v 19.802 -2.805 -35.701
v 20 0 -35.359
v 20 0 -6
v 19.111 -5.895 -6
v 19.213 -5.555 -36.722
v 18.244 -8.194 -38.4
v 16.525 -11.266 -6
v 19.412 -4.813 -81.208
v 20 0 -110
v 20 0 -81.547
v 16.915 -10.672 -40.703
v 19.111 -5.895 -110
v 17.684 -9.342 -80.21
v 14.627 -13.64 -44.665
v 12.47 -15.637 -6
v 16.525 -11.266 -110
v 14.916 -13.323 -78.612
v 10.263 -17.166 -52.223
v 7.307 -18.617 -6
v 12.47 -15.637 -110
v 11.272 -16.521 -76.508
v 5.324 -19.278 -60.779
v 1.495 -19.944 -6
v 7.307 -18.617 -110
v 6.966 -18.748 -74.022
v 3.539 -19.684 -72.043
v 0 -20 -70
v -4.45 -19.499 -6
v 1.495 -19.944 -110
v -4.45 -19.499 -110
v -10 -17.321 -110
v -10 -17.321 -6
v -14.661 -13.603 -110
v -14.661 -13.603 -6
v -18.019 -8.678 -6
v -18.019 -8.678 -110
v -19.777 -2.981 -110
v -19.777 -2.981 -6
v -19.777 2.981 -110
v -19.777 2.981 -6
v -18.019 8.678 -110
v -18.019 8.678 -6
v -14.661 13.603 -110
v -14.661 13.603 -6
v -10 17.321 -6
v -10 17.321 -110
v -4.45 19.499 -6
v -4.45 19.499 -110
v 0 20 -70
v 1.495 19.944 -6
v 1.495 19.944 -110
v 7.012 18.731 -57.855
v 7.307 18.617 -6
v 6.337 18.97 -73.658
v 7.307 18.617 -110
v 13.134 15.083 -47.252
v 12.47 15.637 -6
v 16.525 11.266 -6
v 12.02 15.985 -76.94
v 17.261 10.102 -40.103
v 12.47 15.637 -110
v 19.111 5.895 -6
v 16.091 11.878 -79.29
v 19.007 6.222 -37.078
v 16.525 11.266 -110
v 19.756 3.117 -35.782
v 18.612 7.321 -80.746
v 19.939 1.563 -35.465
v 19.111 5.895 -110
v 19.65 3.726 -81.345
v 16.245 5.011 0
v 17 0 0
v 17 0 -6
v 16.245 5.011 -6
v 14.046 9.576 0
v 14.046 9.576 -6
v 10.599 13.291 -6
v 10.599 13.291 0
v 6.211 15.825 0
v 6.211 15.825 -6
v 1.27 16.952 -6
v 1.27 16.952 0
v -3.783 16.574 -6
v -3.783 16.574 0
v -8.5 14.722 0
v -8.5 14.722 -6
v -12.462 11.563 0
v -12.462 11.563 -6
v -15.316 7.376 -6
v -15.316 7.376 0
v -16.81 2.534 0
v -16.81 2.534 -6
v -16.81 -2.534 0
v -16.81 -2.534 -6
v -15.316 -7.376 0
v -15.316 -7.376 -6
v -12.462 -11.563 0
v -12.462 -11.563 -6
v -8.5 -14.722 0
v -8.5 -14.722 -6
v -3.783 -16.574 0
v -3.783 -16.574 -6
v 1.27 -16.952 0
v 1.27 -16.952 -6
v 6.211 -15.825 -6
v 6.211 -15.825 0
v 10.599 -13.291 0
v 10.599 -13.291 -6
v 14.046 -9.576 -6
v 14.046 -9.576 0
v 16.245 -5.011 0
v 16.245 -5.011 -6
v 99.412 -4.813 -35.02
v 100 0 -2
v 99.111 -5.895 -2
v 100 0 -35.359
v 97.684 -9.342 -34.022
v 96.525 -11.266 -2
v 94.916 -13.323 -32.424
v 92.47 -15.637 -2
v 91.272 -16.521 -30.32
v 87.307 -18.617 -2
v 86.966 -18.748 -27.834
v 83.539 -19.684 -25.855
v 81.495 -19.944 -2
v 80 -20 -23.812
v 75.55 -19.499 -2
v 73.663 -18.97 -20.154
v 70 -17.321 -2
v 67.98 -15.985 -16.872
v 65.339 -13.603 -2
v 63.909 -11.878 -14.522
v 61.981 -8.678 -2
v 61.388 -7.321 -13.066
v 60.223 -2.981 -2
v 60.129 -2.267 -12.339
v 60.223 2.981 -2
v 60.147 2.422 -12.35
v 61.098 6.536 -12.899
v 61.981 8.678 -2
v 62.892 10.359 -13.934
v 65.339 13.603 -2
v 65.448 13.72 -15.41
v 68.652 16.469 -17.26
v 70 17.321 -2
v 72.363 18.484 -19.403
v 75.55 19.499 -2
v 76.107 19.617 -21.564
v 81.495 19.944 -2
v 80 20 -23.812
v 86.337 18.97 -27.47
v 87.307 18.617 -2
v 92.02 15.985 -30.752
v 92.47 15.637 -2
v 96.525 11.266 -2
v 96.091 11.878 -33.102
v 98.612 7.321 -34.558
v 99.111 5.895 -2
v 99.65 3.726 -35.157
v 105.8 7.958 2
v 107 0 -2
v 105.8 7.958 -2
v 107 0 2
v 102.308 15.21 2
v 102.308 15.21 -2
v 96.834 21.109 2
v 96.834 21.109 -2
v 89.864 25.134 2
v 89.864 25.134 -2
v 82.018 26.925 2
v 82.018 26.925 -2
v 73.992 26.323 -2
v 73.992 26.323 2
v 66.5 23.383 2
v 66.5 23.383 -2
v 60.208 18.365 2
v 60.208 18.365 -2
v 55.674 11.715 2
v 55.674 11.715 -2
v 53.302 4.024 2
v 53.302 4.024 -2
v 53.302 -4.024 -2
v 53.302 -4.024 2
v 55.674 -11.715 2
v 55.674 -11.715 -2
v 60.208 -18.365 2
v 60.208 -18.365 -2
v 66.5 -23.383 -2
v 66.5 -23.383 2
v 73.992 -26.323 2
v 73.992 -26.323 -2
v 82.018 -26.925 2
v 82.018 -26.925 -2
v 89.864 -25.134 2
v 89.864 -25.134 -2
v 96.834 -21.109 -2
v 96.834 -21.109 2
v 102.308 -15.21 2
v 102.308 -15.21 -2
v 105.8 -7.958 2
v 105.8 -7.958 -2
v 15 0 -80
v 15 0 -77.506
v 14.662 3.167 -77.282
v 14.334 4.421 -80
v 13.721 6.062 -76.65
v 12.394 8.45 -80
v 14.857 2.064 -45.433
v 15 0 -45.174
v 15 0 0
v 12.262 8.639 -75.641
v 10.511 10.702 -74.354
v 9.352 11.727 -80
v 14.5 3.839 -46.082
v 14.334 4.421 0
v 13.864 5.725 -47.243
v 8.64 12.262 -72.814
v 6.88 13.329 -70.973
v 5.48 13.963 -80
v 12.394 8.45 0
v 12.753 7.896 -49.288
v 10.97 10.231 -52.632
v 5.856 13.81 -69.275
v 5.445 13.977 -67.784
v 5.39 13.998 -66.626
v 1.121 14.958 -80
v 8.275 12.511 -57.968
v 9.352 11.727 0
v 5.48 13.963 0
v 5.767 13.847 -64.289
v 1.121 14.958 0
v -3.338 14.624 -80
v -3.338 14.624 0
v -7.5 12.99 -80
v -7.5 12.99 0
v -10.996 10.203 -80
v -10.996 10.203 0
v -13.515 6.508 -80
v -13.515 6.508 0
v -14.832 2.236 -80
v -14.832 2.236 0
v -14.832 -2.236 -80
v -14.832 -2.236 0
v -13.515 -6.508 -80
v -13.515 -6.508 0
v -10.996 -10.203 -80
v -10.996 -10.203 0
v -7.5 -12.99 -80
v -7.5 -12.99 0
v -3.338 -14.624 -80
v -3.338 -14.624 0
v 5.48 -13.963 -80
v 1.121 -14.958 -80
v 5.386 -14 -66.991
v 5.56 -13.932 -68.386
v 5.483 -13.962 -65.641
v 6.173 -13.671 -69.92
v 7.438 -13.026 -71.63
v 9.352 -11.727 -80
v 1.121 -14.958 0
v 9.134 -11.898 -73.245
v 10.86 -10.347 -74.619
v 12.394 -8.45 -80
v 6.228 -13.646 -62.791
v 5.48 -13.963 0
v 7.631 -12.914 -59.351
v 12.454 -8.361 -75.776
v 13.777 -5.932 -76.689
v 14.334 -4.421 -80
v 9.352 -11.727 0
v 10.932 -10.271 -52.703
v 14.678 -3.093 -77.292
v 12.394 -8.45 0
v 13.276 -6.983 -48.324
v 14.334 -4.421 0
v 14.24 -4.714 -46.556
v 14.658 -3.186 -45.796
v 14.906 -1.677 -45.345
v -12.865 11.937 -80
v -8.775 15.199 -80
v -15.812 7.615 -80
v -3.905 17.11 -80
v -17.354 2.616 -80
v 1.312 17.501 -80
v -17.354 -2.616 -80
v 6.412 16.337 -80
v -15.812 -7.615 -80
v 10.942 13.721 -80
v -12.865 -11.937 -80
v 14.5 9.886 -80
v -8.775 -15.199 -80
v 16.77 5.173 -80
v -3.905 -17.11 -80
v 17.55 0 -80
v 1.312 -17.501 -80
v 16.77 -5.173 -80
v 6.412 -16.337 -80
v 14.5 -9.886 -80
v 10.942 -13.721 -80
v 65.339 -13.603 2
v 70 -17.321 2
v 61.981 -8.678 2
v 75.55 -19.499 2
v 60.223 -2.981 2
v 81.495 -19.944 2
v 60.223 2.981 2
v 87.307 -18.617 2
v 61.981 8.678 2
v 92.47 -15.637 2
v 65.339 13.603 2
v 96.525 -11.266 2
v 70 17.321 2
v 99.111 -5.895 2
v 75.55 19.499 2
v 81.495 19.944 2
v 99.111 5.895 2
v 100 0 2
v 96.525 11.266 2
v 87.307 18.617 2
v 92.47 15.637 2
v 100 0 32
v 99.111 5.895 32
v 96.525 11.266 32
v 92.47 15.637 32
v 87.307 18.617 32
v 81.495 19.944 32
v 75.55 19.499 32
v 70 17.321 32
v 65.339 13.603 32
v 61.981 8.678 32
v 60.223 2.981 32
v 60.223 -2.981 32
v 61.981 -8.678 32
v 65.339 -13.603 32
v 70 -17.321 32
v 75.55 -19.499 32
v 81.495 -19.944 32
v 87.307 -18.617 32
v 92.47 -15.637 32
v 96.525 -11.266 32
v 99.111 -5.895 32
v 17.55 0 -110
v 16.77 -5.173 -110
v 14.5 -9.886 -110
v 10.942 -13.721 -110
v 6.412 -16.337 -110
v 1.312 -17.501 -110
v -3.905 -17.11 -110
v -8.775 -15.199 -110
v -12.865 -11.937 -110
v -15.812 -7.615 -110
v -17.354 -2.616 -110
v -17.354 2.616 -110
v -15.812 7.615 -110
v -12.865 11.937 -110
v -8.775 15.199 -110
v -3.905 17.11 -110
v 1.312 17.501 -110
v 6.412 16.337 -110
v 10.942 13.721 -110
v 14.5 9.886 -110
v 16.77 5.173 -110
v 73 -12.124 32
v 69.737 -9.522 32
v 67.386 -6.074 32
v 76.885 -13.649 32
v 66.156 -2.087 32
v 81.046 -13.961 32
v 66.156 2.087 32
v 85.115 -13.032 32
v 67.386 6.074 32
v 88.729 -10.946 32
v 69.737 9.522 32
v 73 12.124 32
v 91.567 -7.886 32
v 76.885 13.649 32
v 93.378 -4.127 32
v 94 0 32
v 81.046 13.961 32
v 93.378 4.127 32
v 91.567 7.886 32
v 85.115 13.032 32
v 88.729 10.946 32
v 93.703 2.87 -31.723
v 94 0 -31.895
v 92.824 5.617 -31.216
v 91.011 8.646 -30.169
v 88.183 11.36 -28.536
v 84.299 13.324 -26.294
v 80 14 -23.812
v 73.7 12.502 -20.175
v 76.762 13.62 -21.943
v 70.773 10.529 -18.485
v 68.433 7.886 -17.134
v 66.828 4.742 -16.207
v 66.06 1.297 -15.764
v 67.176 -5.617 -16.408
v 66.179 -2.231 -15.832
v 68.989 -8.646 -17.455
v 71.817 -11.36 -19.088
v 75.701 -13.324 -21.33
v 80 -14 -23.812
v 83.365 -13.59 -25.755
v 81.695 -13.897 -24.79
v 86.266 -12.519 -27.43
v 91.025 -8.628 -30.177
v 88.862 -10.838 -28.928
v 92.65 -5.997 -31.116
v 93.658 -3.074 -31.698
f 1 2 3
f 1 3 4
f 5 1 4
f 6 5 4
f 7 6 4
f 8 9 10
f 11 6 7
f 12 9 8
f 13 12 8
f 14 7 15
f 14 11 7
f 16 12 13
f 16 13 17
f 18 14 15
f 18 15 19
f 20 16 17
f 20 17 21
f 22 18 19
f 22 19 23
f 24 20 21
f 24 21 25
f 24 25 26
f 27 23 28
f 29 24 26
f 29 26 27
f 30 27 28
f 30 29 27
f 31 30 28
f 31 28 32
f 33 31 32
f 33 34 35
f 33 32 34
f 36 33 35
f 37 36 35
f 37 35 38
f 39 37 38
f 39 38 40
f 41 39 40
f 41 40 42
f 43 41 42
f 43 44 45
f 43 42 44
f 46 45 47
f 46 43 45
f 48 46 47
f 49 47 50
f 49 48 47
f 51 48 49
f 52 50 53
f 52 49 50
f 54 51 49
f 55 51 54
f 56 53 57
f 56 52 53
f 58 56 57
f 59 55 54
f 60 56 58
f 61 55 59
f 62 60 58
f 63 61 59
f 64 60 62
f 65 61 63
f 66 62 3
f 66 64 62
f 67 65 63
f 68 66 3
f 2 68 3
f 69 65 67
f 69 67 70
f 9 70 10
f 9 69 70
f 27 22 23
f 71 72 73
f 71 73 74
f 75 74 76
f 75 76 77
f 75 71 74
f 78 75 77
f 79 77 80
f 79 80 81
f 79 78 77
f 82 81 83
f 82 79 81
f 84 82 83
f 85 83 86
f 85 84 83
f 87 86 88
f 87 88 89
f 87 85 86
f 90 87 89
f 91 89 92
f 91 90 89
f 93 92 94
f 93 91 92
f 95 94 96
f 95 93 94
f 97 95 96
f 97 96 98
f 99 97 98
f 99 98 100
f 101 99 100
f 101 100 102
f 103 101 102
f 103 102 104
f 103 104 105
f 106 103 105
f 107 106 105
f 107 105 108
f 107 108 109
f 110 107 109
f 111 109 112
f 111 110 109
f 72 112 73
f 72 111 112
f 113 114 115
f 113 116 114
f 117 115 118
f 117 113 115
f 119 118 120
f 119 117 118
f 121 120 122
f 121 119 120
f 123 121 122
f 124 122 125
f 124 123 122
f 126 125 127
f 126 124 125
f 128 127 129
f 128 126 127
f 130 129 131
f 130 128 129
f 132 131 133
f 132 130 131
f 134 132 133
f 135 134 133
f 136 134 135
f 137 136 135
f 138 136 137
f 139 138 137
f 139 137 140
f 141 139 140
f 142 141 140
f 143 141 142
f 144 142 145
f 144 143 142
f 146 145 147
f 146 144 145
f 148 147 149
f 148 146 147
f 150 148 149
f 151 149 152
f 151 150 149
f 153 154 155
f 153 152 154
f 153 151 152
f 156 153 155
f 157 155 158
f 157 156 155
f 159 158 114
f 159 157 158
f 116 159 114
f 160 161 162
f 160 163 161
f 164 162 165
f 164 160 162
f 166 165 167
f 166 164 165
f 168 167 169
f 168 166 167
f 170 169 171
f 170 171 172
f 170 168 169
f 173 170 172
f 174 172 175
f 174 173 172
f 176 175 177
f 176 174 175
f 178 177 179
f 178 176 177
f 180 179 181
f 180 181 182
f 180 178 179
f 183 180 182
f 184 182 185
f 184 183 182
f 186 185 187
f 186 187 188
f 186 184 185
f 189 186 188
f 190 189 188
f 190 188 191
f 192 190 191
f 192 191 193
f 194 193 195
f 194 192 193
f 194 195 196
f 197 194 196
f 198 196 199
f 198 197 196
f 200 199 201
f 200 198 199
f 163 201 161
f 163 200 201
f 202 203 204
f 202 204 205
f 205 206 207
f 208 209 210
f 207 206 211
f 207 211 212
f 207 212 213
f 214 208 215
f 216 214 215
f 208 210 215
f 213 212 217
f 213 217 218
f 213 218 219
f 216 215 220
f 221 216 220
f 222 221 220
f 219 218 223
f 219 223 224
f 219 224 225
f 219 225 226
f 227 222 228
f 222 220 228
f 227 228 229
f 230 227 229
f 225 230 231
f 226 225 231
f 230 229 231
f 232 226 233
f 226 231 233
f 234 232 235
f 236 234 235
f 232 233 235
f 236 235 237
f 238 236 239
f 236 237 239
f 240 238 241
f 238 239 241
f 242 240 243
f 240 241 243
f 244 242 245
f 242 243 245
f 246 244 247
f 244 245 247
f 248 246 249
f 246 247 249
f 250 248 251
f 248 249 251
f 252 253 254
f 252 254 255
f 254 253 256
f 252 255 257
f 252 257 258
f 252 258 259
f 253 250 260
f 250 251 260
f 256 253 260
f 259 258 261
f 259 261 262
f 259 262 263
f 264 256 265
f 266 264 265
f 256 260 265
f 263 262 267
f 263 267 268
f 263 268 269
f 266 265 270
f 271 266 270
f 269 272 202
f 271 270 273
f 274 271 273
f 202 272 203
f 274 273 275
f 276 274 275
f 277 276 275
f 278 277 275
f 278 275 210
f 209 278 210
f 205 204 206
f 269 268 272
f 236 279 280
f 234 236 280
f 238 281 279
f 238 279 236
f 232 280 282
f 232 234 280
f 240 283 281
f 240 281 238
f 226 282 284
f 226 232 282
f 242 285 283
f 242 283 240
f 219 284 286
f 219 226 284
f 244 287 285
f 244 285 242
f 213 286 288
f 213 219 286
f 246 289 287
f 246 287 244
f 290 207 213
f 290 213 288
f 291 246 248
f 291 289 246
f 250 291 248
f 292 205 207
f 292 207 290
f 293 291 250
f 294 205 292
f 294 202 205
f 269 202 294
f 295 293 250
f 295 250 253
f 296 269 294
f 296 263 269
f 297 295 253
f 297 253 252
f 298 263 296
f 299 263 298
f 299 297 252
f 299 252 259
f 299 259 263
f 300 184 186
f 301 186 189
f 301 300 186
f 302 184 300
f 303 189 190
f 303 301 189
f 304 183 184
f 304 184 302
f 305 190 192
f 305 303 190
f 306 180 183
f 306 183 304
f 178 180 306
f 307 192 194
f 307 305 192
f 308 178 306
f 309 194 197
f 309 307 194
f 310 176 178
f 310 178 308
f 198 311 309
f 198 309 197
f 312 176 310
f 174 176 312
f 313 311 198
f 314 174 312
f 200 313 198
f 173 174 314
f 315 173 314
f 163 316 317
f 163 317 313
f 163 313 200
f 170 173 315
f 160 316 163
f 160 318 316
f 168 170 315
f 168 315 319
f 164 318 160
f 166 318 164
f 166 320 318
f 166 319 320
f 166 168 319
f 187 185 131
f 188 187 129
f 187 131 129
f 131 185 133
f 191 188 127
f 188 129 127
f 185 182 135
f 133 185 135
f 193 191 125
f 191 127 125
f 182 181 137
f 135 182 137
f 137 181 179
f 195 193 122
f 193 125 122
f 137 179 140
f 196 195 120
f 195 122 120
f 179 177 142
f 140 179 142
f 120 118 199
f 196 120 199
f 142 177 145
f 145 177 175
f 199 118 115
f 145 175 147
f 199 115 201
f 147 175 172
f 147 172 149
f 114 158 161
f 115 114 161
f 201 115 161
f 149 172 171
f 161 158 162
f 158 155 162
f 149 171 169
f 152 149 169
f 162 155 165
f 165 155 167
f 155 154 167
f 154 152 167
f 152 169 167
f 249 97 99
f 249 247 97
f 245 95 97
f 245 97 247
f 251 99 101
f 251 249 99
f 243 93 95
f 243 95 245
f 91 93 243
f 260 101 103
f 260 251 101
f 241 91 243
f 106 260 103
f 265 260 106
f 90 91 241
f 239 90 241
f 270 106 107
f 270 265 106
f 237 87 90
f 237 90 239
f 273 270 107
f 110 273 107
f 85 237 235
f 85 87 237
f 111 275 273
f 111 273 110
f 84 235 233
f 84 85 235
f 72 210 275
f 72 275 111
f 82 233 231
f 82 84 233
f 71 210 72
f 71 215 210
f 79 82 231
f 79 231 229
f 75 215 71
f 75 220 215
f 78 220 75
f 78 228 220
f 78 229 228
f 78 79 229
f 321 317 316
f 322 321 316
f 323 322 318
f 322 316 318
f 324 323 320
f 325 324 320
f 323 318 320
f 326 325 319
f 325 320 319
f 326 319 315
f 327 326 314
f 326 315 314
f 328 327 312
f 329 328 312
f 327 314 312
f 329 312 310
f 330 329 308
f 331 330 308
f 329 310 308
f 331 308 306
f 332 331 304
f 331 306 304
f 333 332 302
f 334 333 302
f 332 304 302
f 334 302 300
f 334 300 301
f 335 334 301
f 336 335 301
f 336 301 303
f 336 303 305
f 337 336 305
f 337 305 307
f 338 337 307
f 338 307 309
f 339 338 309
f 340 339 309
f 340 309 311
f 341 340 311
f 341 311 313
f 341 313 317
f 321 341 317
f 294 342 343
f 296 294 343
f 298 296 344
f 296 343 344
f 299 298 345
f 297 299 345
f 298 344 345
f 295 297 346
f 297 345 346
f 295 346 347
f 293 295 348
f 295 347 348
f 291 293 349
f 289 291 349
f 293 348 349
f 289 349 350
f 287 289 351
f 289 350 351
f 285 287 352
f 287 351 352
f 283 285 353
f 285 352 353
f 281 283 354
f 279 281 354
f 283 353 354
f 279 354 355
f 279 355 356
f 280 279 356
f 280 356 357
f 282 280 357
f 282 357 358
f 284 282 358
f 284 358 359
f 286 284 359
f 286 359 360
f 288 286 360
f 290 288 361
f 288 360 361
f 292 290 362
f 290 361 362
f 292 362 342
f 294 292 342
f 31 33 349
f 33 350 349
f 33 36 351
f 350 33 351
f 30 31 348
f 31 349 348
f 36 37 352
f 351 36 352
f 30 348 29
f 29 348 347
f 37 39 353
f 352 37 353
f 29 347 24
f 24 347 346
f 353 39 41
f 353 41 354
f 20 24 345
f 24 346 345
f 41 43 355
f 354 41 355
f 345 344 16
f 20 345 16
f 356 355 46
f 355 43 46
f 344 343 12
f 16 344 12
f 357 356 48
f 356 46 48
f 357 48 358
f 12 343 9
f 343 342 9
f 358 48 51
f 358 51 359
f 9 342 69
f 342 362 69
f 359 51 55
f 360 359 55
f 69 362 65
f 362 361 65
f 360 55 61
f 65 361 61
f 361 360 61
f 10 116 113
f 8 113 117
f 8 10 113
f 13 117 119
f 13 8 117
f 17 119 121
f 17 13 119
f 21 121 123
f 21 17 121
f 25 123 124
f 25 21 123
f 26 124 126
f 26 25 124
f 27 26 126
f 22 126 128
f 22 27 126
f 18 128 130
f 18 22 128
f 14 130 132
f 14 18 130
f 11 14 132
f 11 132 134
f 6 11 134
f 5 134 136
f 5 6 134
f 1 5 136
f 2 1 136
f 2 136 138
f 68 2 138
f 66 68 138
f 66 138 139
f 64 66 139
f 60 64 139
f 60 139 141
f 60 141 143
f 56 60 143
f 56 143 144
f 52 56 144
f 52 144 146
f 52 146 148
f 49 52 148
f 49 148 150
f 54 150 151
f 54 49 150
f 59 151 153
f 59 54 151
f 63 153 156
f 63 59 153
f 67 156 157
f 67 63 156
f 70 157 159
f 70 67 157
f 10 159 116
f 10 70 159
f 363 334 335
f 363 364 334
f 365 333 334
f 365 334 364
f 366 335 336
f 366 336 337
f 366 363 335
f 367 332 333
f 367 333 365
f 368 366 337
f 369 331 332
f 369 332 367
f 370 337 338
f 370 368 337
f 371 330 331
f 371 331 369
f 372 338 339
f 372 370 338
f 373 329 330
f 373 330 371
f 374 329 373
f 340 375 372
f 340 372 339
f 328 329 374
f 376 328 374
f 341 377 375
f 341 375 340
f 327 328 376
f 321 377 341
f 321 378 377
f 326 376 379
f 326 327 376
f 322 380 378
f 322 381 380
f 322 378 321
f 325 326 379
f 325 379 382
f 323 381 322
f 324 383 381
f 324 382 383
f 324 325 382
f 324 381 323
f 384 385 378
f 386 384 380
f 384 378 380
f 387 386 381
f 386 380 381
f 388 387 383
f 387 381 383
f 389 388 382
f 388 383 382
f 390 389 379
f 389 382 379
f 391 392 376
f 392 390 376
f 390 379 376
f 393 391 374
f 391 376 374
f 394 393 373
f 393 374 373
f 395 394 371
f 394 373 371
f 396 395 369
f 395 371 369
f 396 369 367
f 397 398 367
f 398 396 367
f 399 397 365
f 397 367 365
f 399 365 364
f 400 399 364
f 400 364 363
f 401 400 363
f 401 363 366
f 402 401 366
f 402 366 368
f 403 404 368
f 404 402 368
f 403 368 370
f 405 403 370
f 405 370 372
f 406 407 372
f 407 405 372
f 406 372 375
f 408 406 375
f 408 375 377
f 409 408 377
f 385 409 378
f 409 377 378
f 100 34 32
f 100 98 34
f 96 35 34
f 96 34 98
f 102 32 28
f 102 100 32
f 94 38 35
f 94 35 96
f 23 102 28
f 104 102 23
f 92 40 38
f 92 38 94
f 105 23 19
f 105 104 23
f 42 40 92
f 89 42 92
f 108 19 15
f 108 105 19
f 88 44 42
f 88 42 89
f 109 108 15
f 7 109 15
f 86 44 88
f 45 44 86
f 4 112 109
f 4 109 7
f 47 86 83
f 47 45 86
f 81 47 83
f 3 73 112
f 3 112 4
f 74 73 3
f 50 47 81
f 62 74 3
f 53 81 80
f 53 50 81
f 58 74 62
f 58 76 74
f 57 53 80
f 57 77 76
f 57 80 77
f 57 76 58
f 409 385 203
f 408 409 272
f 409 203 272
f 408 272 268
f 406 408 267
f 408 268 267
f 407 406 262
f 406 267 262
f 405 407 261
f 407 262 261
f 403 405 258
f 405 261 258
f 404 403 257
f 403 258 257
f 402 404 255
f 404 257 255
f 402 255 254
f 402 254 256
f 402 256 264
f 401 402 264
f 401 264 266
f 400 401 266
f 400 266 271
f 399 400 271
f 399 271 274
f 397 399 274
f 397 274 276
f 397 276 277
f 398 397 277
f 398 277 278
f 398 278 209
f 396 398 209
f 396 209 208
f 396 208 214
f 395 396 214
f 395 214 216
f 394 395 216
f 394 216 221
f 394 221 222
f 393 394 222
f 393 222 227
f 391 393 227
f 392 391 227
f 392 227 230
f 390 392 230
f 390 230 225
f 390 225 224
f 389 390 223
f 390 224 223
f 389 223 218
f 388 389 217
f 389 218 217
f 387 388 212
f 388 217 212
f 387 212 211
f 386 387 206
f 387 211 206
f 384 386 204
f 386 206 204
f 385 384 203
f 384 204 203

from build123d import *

# Parameters (mm, degrees)
F1_R      = 20
F4_R      = 17.55
F5_DEPTH  = 30
F6_R      = 15
F7_DEPTH  = 110.001
F8_R      = 20
F8_R_2    = 17
F9_DEPTH  = 6
F10_R     = 14
F12_R     = 27
F12_R_2   = 20
F13_DEPTH = 2
F14_DEPTH = 32
F15_R     = 14
F16_DEPTH = 34


with BuildPart() as f2:
    # F2: sweep along a path in F0
    with BuildLine(Plane.XZ) as f2_path:
        Line((0, 0), (0, -70))
        Line((0, -70), (0, -110))
    # F1 (on Top) → F2 (sweep)
    with BuildSketch(Plane.XY):
        Circle(F1_R)
    sweep(path=f2_path.line)

    # F3: sweep along a path in F0
    with BuildLine(Plane.XZ) as f3_path:
        Line((80, 0), (80, -23.8119784648))
        Line((80, -23.8119784648), (0, -70))
    # F1 (on Top) → F3 (sweep)
    with BuildSketch(Plane.XY):
        with Locations((80, 0)):
            Circle(F1_R)
    sweep(path=f3_path.line, transition=Transition.RIGHT)

    # F4 (on face) → F5 (cut)
    with BuildSketch(Plane(origin=(0, 0, -110), x_dir=(1, 0, 0), z_dir=(0, 0, -1))):
        Circle(F4_R)
    extrude(amount=-F5_DEPTH, mode=Mode.SUBTRACT)

    # F6 (on face) → F7 (cut, through all)
    with BuildSketch(Plane.XY):
        Circle(F6_R)
    extrude(amount=-F7_DEPTH, mode=Mode.SUBTRACT)

    # F8 (on face) → F9 (cut)
    with BuildSketch(Plane.XY):
        Circle(F8_R)
        Circle(F8_R_2, mode=Mode.SUBTRACT)
    extrude(amount=-F9_DEPTH, mode=Mode.SUBTRACT)

    # F11: sweep along a path in F0
    with BuildLine(Plane.XZ) as f11_path:
        Line((80, 0), (80, -23.8119784648))
        Line((80, -23.8119784648), (0, -70))
    # F10 (on face) → F11 (sweep, cut)
    with BuildSketch(Plane.XY):
        with Locations((80, 0)):
            Circle(F10_R)
    sweep(path=f11_path.line, transition=Transition.RIGHT, mode=Mode.SUBTRACT)

    # F12 (on face) → F13 (join, symmetric)
    with BuildSketch(Plane.XY):
        with Locations((80, 0)):
            Circle(F12_R)
        with Locations((80, 0)):
            Circle(F12_R_2, mode=Mode.SUBTRACT)
    extrude(amount=F13_DEPTH, both=True)

    # F1 (on Top) → F14 (join)
    with BuildSketch(Plane.XY):
        with Locations((80, 0)):
            Circle(F1_R)
    extrude(amount=F14_DEPTH)

    # F15 (on face) → F16 (cut)
    with BuildSketch(Plane.XY.offset(32)):
        with Locations((80, 0)):
            Circle(F15_R)
    extrude(amount=-F16_DEPTH, mode=Mode.SUBTRACT)


solid = f2.part
